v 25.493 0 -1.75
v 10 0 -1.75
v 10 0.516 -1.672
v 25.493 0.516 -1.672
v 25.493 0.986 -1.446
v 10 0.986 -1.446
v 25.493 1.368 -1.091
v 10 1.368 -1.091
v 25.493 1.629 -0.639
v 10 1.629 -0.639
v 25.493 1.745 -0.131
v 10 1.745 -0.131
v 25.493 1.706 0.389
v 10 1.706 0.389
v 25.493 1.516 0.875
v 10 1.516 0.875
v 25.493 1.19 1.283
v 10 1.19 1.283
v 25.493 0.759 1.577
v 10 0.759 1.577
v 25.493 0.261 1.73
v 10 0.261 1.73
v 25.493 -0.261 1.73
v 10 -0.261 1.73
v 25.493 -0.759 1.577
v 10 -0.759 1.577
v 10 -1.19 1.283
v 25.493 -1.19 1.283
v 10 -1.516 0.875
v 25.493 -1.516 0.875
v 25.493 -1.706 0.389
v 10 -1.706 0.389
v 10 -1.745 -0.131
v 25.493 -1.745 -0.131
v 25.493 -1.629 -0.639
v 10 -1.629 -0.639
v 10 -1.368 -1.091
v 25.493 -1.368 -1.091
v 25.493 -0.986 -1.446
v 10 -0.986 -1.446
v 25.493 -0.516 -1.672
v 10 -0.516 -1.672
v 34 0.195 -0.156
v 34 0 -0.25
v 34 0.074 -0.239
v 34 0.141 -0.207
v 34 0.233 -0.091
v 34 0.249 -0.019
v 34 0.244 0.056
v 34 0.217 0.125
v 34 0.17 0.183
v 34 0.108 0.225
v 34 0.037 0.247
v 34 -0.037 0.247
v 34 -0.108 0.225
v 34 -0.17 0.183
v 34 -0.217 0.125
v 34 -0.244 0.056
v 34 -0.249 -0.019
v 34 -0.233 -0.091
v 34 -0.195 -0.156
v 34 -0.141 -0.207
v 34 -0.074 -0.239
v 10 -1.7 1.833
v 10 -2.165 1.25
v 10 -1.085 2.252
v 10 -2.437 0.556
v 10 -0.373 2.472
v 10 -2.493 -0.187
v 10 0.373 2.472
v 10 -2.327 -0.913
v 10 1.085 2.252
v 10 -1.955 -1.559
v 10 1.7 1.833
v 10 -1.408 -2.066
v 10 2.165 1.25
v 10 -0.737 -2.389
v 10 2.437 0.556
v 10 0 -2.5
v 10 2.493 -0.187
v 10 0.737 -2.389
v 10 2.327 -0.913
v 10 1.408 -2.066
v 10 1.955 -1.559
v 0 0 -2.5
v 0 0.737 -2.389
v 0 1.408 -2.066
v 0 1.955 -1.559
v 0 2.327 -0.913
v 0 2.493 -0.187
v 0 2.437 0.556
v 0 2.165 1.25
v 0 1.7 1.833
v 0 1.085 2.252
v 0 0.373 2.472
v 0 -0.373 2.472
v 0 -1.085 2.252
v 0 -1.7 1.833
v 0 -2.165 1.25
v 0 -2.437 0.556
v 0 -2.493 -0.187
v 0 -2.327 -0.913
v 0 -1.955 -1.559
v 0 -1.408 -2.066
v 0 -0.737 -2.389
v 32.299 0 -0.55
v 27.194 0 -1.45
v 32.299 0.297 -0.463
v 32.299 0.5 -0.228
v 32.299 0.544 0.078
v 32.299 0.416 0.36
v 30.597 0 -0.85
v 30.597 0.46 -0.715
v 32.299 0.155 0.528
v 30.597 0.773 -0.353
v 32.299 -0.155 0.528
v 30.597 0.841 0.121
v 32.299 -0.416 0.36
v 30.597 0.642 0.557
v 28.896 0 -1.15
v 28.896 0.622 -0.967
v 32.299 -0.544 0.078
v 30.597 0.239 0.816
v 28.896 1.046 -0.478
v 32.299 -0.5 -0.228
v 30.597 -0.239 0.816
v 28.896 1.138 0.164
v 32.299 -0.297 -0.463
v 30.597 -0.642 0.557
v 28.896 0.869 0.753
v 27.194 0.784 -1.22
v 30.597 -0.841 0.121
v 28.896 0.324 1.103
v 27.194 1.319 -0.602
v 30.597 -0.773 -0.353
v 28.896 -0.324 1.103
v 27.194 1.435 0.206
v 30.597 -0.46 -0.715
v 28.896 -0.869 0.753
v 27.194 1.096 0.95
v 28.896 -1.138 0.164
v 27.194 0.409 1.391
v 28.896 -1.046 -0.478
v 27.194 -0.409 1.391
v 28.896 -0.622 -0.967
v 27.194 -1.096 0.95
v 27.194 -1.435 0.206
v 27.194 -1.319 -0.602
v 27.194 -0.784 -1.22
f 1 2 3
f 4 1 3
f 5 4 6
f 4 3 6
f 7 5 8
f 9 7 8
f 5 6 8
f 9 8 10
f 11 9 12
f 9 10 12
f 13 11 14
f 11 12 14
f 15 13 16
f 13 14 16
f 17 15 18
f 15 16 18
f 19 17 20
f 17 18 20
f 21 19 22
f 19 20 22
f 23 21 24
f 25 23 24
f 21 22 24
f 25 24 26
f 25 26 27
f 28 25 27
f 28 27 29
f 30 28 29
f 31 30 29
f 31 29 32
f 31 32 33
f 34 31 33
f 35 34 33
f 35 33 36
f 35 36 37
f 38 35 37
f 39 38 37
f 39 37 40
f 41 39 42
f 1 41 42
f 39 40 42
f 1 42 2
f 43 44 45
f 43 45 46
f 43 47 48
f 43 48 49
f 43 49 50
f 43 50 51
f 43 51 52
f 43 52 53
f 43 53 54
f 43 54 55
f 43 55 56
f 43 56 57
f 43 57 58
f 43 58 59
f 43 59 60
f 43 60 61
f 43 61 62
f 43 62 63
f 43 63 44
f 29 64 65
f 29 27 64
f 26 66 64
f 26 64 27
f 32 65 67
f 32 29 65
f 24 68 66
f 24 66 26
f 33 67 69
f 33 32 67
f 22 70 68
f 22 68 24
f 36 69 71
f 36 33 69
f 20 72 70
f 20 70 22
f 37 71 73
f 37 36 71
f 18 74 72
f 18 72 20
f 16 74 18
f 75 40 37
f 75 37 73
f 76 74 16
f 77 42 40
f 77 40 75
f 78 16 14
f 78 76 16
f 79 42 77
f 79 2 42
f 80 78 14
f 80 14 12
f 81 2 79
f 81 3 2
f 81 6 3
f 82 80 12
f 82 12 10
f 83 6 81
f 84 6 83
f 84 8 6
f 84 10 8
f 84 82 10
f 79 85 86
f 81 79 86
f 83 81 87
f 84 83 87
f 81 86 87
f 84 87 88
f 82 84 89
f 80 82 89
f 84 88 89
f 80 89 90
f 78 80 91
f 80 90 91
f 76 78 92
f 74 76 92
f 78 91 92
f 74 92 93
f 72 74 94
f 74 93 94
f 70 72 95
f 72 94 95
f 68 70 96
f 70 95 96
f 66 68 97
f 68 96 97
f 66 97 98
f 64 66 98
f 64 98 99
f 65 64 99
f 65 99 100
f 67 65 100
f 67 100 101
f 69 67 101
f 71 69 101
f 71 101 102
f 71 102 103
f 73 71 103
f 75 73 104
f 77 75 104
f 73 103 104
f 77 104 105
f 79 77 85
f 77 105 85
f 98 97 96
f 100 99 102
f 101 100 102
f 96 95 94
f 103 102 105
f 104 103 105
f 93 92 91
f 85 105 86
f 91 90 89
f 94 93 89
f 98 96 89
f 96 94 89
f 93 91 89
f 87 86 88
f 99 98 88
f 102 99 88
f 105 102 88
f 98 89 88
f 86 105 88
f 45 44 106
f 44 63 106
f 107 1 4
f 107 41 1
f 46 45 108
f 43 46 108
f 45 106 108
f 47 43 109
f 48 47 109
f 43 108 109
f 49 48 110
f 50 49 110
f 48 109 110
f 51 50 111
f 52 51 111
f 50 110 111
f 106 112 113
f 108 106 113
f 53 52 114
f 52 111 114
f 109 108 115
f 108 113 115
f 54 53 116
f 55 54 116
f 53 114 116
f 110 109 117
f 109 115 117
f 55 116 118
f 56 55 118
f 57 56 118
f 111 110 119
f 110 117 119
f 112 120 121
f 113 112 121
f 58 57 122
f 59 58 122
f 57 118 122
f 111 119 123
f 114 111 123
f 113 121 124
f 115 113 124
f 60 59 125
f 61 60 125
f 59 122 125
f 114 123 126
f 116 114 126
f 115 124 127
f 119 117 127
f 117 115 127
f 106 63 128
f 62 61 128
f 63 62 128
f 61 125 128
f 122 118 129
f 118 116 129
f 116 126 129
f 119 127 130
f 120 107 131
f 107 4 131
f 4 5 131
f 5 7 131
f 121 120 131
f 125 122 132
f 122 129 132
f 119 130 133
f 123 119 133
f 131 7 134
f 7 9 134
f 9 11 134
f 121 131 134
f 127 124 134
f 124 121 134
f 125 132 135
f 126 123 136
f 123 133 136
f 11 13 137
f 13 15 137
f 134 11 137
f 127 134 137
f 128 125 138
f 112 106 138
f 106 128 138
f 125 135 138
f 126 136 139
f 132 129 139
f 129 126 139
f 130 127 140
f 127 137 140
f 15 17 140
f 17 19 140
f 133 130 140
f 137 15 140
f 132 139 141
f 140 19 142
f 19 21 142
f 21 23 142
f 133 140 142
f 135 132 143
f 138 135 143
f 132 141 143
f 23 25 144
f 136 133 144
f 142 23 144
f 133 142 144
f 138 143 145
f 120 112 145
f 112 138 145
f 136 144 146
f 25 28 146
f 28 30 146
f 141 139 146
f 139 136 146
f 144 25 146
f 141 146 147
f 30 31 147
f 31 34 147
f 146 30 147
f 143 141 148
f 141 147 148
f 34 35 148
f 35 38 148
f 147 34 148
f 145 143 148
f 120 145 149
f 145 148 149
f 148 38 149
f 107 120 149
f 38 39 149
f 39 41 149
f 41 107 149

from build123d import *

# Parameters (mm, degrees)
SKETCH1_R           = 2.5
BOSS_EXTRUDE1_DEPTH = 10
SKETCH2_R           = 1.75
BOSS_EXTRUDE2_DEPTH = 24
CHAMFER1_SIZE       = 1.5
CHAMFER1_SIZE2      = 8.506922729


with BuildPart() as part:
    # Sketch1 → Boss-Extrude1 (new body)
    with BuildSketch(Plane(origin=(0, 0, 0), x_dir=(0, 0, -1), z_dir=(1, 0, 0))):
        Circle(SKETCH1_R)
    extrude(amount=BOSS_EXTRUDE1_DEPTH)

    # Sketch2 → Boss-Extrude2 (add)
    with BuildSketch(Plane(origin=(10, 0, 0), x_dir=(0, 0, -1), z_dir=(1, 0, 0))):
        Circle(SKETCH2_R)
    extrude(amount=BOSS_EXTRUDE2_DEPTH)

    # Chamfer1
    chamfer1_edges = [part.edges().sort_by_distance(p)[0] for p in [
        (34, 0, 1.75),
    ]]
    chamfer1_side = [part.faces().sort_by_distance(p)[0] for p in [
        (34, 0, 0),
    ]]
    chamfer(chamfer1_edges, length=CHAMFER1_SIZE, length2=CHAMFER1_SIZE2, reference=chamfer1_side[0])


solid = part.part
